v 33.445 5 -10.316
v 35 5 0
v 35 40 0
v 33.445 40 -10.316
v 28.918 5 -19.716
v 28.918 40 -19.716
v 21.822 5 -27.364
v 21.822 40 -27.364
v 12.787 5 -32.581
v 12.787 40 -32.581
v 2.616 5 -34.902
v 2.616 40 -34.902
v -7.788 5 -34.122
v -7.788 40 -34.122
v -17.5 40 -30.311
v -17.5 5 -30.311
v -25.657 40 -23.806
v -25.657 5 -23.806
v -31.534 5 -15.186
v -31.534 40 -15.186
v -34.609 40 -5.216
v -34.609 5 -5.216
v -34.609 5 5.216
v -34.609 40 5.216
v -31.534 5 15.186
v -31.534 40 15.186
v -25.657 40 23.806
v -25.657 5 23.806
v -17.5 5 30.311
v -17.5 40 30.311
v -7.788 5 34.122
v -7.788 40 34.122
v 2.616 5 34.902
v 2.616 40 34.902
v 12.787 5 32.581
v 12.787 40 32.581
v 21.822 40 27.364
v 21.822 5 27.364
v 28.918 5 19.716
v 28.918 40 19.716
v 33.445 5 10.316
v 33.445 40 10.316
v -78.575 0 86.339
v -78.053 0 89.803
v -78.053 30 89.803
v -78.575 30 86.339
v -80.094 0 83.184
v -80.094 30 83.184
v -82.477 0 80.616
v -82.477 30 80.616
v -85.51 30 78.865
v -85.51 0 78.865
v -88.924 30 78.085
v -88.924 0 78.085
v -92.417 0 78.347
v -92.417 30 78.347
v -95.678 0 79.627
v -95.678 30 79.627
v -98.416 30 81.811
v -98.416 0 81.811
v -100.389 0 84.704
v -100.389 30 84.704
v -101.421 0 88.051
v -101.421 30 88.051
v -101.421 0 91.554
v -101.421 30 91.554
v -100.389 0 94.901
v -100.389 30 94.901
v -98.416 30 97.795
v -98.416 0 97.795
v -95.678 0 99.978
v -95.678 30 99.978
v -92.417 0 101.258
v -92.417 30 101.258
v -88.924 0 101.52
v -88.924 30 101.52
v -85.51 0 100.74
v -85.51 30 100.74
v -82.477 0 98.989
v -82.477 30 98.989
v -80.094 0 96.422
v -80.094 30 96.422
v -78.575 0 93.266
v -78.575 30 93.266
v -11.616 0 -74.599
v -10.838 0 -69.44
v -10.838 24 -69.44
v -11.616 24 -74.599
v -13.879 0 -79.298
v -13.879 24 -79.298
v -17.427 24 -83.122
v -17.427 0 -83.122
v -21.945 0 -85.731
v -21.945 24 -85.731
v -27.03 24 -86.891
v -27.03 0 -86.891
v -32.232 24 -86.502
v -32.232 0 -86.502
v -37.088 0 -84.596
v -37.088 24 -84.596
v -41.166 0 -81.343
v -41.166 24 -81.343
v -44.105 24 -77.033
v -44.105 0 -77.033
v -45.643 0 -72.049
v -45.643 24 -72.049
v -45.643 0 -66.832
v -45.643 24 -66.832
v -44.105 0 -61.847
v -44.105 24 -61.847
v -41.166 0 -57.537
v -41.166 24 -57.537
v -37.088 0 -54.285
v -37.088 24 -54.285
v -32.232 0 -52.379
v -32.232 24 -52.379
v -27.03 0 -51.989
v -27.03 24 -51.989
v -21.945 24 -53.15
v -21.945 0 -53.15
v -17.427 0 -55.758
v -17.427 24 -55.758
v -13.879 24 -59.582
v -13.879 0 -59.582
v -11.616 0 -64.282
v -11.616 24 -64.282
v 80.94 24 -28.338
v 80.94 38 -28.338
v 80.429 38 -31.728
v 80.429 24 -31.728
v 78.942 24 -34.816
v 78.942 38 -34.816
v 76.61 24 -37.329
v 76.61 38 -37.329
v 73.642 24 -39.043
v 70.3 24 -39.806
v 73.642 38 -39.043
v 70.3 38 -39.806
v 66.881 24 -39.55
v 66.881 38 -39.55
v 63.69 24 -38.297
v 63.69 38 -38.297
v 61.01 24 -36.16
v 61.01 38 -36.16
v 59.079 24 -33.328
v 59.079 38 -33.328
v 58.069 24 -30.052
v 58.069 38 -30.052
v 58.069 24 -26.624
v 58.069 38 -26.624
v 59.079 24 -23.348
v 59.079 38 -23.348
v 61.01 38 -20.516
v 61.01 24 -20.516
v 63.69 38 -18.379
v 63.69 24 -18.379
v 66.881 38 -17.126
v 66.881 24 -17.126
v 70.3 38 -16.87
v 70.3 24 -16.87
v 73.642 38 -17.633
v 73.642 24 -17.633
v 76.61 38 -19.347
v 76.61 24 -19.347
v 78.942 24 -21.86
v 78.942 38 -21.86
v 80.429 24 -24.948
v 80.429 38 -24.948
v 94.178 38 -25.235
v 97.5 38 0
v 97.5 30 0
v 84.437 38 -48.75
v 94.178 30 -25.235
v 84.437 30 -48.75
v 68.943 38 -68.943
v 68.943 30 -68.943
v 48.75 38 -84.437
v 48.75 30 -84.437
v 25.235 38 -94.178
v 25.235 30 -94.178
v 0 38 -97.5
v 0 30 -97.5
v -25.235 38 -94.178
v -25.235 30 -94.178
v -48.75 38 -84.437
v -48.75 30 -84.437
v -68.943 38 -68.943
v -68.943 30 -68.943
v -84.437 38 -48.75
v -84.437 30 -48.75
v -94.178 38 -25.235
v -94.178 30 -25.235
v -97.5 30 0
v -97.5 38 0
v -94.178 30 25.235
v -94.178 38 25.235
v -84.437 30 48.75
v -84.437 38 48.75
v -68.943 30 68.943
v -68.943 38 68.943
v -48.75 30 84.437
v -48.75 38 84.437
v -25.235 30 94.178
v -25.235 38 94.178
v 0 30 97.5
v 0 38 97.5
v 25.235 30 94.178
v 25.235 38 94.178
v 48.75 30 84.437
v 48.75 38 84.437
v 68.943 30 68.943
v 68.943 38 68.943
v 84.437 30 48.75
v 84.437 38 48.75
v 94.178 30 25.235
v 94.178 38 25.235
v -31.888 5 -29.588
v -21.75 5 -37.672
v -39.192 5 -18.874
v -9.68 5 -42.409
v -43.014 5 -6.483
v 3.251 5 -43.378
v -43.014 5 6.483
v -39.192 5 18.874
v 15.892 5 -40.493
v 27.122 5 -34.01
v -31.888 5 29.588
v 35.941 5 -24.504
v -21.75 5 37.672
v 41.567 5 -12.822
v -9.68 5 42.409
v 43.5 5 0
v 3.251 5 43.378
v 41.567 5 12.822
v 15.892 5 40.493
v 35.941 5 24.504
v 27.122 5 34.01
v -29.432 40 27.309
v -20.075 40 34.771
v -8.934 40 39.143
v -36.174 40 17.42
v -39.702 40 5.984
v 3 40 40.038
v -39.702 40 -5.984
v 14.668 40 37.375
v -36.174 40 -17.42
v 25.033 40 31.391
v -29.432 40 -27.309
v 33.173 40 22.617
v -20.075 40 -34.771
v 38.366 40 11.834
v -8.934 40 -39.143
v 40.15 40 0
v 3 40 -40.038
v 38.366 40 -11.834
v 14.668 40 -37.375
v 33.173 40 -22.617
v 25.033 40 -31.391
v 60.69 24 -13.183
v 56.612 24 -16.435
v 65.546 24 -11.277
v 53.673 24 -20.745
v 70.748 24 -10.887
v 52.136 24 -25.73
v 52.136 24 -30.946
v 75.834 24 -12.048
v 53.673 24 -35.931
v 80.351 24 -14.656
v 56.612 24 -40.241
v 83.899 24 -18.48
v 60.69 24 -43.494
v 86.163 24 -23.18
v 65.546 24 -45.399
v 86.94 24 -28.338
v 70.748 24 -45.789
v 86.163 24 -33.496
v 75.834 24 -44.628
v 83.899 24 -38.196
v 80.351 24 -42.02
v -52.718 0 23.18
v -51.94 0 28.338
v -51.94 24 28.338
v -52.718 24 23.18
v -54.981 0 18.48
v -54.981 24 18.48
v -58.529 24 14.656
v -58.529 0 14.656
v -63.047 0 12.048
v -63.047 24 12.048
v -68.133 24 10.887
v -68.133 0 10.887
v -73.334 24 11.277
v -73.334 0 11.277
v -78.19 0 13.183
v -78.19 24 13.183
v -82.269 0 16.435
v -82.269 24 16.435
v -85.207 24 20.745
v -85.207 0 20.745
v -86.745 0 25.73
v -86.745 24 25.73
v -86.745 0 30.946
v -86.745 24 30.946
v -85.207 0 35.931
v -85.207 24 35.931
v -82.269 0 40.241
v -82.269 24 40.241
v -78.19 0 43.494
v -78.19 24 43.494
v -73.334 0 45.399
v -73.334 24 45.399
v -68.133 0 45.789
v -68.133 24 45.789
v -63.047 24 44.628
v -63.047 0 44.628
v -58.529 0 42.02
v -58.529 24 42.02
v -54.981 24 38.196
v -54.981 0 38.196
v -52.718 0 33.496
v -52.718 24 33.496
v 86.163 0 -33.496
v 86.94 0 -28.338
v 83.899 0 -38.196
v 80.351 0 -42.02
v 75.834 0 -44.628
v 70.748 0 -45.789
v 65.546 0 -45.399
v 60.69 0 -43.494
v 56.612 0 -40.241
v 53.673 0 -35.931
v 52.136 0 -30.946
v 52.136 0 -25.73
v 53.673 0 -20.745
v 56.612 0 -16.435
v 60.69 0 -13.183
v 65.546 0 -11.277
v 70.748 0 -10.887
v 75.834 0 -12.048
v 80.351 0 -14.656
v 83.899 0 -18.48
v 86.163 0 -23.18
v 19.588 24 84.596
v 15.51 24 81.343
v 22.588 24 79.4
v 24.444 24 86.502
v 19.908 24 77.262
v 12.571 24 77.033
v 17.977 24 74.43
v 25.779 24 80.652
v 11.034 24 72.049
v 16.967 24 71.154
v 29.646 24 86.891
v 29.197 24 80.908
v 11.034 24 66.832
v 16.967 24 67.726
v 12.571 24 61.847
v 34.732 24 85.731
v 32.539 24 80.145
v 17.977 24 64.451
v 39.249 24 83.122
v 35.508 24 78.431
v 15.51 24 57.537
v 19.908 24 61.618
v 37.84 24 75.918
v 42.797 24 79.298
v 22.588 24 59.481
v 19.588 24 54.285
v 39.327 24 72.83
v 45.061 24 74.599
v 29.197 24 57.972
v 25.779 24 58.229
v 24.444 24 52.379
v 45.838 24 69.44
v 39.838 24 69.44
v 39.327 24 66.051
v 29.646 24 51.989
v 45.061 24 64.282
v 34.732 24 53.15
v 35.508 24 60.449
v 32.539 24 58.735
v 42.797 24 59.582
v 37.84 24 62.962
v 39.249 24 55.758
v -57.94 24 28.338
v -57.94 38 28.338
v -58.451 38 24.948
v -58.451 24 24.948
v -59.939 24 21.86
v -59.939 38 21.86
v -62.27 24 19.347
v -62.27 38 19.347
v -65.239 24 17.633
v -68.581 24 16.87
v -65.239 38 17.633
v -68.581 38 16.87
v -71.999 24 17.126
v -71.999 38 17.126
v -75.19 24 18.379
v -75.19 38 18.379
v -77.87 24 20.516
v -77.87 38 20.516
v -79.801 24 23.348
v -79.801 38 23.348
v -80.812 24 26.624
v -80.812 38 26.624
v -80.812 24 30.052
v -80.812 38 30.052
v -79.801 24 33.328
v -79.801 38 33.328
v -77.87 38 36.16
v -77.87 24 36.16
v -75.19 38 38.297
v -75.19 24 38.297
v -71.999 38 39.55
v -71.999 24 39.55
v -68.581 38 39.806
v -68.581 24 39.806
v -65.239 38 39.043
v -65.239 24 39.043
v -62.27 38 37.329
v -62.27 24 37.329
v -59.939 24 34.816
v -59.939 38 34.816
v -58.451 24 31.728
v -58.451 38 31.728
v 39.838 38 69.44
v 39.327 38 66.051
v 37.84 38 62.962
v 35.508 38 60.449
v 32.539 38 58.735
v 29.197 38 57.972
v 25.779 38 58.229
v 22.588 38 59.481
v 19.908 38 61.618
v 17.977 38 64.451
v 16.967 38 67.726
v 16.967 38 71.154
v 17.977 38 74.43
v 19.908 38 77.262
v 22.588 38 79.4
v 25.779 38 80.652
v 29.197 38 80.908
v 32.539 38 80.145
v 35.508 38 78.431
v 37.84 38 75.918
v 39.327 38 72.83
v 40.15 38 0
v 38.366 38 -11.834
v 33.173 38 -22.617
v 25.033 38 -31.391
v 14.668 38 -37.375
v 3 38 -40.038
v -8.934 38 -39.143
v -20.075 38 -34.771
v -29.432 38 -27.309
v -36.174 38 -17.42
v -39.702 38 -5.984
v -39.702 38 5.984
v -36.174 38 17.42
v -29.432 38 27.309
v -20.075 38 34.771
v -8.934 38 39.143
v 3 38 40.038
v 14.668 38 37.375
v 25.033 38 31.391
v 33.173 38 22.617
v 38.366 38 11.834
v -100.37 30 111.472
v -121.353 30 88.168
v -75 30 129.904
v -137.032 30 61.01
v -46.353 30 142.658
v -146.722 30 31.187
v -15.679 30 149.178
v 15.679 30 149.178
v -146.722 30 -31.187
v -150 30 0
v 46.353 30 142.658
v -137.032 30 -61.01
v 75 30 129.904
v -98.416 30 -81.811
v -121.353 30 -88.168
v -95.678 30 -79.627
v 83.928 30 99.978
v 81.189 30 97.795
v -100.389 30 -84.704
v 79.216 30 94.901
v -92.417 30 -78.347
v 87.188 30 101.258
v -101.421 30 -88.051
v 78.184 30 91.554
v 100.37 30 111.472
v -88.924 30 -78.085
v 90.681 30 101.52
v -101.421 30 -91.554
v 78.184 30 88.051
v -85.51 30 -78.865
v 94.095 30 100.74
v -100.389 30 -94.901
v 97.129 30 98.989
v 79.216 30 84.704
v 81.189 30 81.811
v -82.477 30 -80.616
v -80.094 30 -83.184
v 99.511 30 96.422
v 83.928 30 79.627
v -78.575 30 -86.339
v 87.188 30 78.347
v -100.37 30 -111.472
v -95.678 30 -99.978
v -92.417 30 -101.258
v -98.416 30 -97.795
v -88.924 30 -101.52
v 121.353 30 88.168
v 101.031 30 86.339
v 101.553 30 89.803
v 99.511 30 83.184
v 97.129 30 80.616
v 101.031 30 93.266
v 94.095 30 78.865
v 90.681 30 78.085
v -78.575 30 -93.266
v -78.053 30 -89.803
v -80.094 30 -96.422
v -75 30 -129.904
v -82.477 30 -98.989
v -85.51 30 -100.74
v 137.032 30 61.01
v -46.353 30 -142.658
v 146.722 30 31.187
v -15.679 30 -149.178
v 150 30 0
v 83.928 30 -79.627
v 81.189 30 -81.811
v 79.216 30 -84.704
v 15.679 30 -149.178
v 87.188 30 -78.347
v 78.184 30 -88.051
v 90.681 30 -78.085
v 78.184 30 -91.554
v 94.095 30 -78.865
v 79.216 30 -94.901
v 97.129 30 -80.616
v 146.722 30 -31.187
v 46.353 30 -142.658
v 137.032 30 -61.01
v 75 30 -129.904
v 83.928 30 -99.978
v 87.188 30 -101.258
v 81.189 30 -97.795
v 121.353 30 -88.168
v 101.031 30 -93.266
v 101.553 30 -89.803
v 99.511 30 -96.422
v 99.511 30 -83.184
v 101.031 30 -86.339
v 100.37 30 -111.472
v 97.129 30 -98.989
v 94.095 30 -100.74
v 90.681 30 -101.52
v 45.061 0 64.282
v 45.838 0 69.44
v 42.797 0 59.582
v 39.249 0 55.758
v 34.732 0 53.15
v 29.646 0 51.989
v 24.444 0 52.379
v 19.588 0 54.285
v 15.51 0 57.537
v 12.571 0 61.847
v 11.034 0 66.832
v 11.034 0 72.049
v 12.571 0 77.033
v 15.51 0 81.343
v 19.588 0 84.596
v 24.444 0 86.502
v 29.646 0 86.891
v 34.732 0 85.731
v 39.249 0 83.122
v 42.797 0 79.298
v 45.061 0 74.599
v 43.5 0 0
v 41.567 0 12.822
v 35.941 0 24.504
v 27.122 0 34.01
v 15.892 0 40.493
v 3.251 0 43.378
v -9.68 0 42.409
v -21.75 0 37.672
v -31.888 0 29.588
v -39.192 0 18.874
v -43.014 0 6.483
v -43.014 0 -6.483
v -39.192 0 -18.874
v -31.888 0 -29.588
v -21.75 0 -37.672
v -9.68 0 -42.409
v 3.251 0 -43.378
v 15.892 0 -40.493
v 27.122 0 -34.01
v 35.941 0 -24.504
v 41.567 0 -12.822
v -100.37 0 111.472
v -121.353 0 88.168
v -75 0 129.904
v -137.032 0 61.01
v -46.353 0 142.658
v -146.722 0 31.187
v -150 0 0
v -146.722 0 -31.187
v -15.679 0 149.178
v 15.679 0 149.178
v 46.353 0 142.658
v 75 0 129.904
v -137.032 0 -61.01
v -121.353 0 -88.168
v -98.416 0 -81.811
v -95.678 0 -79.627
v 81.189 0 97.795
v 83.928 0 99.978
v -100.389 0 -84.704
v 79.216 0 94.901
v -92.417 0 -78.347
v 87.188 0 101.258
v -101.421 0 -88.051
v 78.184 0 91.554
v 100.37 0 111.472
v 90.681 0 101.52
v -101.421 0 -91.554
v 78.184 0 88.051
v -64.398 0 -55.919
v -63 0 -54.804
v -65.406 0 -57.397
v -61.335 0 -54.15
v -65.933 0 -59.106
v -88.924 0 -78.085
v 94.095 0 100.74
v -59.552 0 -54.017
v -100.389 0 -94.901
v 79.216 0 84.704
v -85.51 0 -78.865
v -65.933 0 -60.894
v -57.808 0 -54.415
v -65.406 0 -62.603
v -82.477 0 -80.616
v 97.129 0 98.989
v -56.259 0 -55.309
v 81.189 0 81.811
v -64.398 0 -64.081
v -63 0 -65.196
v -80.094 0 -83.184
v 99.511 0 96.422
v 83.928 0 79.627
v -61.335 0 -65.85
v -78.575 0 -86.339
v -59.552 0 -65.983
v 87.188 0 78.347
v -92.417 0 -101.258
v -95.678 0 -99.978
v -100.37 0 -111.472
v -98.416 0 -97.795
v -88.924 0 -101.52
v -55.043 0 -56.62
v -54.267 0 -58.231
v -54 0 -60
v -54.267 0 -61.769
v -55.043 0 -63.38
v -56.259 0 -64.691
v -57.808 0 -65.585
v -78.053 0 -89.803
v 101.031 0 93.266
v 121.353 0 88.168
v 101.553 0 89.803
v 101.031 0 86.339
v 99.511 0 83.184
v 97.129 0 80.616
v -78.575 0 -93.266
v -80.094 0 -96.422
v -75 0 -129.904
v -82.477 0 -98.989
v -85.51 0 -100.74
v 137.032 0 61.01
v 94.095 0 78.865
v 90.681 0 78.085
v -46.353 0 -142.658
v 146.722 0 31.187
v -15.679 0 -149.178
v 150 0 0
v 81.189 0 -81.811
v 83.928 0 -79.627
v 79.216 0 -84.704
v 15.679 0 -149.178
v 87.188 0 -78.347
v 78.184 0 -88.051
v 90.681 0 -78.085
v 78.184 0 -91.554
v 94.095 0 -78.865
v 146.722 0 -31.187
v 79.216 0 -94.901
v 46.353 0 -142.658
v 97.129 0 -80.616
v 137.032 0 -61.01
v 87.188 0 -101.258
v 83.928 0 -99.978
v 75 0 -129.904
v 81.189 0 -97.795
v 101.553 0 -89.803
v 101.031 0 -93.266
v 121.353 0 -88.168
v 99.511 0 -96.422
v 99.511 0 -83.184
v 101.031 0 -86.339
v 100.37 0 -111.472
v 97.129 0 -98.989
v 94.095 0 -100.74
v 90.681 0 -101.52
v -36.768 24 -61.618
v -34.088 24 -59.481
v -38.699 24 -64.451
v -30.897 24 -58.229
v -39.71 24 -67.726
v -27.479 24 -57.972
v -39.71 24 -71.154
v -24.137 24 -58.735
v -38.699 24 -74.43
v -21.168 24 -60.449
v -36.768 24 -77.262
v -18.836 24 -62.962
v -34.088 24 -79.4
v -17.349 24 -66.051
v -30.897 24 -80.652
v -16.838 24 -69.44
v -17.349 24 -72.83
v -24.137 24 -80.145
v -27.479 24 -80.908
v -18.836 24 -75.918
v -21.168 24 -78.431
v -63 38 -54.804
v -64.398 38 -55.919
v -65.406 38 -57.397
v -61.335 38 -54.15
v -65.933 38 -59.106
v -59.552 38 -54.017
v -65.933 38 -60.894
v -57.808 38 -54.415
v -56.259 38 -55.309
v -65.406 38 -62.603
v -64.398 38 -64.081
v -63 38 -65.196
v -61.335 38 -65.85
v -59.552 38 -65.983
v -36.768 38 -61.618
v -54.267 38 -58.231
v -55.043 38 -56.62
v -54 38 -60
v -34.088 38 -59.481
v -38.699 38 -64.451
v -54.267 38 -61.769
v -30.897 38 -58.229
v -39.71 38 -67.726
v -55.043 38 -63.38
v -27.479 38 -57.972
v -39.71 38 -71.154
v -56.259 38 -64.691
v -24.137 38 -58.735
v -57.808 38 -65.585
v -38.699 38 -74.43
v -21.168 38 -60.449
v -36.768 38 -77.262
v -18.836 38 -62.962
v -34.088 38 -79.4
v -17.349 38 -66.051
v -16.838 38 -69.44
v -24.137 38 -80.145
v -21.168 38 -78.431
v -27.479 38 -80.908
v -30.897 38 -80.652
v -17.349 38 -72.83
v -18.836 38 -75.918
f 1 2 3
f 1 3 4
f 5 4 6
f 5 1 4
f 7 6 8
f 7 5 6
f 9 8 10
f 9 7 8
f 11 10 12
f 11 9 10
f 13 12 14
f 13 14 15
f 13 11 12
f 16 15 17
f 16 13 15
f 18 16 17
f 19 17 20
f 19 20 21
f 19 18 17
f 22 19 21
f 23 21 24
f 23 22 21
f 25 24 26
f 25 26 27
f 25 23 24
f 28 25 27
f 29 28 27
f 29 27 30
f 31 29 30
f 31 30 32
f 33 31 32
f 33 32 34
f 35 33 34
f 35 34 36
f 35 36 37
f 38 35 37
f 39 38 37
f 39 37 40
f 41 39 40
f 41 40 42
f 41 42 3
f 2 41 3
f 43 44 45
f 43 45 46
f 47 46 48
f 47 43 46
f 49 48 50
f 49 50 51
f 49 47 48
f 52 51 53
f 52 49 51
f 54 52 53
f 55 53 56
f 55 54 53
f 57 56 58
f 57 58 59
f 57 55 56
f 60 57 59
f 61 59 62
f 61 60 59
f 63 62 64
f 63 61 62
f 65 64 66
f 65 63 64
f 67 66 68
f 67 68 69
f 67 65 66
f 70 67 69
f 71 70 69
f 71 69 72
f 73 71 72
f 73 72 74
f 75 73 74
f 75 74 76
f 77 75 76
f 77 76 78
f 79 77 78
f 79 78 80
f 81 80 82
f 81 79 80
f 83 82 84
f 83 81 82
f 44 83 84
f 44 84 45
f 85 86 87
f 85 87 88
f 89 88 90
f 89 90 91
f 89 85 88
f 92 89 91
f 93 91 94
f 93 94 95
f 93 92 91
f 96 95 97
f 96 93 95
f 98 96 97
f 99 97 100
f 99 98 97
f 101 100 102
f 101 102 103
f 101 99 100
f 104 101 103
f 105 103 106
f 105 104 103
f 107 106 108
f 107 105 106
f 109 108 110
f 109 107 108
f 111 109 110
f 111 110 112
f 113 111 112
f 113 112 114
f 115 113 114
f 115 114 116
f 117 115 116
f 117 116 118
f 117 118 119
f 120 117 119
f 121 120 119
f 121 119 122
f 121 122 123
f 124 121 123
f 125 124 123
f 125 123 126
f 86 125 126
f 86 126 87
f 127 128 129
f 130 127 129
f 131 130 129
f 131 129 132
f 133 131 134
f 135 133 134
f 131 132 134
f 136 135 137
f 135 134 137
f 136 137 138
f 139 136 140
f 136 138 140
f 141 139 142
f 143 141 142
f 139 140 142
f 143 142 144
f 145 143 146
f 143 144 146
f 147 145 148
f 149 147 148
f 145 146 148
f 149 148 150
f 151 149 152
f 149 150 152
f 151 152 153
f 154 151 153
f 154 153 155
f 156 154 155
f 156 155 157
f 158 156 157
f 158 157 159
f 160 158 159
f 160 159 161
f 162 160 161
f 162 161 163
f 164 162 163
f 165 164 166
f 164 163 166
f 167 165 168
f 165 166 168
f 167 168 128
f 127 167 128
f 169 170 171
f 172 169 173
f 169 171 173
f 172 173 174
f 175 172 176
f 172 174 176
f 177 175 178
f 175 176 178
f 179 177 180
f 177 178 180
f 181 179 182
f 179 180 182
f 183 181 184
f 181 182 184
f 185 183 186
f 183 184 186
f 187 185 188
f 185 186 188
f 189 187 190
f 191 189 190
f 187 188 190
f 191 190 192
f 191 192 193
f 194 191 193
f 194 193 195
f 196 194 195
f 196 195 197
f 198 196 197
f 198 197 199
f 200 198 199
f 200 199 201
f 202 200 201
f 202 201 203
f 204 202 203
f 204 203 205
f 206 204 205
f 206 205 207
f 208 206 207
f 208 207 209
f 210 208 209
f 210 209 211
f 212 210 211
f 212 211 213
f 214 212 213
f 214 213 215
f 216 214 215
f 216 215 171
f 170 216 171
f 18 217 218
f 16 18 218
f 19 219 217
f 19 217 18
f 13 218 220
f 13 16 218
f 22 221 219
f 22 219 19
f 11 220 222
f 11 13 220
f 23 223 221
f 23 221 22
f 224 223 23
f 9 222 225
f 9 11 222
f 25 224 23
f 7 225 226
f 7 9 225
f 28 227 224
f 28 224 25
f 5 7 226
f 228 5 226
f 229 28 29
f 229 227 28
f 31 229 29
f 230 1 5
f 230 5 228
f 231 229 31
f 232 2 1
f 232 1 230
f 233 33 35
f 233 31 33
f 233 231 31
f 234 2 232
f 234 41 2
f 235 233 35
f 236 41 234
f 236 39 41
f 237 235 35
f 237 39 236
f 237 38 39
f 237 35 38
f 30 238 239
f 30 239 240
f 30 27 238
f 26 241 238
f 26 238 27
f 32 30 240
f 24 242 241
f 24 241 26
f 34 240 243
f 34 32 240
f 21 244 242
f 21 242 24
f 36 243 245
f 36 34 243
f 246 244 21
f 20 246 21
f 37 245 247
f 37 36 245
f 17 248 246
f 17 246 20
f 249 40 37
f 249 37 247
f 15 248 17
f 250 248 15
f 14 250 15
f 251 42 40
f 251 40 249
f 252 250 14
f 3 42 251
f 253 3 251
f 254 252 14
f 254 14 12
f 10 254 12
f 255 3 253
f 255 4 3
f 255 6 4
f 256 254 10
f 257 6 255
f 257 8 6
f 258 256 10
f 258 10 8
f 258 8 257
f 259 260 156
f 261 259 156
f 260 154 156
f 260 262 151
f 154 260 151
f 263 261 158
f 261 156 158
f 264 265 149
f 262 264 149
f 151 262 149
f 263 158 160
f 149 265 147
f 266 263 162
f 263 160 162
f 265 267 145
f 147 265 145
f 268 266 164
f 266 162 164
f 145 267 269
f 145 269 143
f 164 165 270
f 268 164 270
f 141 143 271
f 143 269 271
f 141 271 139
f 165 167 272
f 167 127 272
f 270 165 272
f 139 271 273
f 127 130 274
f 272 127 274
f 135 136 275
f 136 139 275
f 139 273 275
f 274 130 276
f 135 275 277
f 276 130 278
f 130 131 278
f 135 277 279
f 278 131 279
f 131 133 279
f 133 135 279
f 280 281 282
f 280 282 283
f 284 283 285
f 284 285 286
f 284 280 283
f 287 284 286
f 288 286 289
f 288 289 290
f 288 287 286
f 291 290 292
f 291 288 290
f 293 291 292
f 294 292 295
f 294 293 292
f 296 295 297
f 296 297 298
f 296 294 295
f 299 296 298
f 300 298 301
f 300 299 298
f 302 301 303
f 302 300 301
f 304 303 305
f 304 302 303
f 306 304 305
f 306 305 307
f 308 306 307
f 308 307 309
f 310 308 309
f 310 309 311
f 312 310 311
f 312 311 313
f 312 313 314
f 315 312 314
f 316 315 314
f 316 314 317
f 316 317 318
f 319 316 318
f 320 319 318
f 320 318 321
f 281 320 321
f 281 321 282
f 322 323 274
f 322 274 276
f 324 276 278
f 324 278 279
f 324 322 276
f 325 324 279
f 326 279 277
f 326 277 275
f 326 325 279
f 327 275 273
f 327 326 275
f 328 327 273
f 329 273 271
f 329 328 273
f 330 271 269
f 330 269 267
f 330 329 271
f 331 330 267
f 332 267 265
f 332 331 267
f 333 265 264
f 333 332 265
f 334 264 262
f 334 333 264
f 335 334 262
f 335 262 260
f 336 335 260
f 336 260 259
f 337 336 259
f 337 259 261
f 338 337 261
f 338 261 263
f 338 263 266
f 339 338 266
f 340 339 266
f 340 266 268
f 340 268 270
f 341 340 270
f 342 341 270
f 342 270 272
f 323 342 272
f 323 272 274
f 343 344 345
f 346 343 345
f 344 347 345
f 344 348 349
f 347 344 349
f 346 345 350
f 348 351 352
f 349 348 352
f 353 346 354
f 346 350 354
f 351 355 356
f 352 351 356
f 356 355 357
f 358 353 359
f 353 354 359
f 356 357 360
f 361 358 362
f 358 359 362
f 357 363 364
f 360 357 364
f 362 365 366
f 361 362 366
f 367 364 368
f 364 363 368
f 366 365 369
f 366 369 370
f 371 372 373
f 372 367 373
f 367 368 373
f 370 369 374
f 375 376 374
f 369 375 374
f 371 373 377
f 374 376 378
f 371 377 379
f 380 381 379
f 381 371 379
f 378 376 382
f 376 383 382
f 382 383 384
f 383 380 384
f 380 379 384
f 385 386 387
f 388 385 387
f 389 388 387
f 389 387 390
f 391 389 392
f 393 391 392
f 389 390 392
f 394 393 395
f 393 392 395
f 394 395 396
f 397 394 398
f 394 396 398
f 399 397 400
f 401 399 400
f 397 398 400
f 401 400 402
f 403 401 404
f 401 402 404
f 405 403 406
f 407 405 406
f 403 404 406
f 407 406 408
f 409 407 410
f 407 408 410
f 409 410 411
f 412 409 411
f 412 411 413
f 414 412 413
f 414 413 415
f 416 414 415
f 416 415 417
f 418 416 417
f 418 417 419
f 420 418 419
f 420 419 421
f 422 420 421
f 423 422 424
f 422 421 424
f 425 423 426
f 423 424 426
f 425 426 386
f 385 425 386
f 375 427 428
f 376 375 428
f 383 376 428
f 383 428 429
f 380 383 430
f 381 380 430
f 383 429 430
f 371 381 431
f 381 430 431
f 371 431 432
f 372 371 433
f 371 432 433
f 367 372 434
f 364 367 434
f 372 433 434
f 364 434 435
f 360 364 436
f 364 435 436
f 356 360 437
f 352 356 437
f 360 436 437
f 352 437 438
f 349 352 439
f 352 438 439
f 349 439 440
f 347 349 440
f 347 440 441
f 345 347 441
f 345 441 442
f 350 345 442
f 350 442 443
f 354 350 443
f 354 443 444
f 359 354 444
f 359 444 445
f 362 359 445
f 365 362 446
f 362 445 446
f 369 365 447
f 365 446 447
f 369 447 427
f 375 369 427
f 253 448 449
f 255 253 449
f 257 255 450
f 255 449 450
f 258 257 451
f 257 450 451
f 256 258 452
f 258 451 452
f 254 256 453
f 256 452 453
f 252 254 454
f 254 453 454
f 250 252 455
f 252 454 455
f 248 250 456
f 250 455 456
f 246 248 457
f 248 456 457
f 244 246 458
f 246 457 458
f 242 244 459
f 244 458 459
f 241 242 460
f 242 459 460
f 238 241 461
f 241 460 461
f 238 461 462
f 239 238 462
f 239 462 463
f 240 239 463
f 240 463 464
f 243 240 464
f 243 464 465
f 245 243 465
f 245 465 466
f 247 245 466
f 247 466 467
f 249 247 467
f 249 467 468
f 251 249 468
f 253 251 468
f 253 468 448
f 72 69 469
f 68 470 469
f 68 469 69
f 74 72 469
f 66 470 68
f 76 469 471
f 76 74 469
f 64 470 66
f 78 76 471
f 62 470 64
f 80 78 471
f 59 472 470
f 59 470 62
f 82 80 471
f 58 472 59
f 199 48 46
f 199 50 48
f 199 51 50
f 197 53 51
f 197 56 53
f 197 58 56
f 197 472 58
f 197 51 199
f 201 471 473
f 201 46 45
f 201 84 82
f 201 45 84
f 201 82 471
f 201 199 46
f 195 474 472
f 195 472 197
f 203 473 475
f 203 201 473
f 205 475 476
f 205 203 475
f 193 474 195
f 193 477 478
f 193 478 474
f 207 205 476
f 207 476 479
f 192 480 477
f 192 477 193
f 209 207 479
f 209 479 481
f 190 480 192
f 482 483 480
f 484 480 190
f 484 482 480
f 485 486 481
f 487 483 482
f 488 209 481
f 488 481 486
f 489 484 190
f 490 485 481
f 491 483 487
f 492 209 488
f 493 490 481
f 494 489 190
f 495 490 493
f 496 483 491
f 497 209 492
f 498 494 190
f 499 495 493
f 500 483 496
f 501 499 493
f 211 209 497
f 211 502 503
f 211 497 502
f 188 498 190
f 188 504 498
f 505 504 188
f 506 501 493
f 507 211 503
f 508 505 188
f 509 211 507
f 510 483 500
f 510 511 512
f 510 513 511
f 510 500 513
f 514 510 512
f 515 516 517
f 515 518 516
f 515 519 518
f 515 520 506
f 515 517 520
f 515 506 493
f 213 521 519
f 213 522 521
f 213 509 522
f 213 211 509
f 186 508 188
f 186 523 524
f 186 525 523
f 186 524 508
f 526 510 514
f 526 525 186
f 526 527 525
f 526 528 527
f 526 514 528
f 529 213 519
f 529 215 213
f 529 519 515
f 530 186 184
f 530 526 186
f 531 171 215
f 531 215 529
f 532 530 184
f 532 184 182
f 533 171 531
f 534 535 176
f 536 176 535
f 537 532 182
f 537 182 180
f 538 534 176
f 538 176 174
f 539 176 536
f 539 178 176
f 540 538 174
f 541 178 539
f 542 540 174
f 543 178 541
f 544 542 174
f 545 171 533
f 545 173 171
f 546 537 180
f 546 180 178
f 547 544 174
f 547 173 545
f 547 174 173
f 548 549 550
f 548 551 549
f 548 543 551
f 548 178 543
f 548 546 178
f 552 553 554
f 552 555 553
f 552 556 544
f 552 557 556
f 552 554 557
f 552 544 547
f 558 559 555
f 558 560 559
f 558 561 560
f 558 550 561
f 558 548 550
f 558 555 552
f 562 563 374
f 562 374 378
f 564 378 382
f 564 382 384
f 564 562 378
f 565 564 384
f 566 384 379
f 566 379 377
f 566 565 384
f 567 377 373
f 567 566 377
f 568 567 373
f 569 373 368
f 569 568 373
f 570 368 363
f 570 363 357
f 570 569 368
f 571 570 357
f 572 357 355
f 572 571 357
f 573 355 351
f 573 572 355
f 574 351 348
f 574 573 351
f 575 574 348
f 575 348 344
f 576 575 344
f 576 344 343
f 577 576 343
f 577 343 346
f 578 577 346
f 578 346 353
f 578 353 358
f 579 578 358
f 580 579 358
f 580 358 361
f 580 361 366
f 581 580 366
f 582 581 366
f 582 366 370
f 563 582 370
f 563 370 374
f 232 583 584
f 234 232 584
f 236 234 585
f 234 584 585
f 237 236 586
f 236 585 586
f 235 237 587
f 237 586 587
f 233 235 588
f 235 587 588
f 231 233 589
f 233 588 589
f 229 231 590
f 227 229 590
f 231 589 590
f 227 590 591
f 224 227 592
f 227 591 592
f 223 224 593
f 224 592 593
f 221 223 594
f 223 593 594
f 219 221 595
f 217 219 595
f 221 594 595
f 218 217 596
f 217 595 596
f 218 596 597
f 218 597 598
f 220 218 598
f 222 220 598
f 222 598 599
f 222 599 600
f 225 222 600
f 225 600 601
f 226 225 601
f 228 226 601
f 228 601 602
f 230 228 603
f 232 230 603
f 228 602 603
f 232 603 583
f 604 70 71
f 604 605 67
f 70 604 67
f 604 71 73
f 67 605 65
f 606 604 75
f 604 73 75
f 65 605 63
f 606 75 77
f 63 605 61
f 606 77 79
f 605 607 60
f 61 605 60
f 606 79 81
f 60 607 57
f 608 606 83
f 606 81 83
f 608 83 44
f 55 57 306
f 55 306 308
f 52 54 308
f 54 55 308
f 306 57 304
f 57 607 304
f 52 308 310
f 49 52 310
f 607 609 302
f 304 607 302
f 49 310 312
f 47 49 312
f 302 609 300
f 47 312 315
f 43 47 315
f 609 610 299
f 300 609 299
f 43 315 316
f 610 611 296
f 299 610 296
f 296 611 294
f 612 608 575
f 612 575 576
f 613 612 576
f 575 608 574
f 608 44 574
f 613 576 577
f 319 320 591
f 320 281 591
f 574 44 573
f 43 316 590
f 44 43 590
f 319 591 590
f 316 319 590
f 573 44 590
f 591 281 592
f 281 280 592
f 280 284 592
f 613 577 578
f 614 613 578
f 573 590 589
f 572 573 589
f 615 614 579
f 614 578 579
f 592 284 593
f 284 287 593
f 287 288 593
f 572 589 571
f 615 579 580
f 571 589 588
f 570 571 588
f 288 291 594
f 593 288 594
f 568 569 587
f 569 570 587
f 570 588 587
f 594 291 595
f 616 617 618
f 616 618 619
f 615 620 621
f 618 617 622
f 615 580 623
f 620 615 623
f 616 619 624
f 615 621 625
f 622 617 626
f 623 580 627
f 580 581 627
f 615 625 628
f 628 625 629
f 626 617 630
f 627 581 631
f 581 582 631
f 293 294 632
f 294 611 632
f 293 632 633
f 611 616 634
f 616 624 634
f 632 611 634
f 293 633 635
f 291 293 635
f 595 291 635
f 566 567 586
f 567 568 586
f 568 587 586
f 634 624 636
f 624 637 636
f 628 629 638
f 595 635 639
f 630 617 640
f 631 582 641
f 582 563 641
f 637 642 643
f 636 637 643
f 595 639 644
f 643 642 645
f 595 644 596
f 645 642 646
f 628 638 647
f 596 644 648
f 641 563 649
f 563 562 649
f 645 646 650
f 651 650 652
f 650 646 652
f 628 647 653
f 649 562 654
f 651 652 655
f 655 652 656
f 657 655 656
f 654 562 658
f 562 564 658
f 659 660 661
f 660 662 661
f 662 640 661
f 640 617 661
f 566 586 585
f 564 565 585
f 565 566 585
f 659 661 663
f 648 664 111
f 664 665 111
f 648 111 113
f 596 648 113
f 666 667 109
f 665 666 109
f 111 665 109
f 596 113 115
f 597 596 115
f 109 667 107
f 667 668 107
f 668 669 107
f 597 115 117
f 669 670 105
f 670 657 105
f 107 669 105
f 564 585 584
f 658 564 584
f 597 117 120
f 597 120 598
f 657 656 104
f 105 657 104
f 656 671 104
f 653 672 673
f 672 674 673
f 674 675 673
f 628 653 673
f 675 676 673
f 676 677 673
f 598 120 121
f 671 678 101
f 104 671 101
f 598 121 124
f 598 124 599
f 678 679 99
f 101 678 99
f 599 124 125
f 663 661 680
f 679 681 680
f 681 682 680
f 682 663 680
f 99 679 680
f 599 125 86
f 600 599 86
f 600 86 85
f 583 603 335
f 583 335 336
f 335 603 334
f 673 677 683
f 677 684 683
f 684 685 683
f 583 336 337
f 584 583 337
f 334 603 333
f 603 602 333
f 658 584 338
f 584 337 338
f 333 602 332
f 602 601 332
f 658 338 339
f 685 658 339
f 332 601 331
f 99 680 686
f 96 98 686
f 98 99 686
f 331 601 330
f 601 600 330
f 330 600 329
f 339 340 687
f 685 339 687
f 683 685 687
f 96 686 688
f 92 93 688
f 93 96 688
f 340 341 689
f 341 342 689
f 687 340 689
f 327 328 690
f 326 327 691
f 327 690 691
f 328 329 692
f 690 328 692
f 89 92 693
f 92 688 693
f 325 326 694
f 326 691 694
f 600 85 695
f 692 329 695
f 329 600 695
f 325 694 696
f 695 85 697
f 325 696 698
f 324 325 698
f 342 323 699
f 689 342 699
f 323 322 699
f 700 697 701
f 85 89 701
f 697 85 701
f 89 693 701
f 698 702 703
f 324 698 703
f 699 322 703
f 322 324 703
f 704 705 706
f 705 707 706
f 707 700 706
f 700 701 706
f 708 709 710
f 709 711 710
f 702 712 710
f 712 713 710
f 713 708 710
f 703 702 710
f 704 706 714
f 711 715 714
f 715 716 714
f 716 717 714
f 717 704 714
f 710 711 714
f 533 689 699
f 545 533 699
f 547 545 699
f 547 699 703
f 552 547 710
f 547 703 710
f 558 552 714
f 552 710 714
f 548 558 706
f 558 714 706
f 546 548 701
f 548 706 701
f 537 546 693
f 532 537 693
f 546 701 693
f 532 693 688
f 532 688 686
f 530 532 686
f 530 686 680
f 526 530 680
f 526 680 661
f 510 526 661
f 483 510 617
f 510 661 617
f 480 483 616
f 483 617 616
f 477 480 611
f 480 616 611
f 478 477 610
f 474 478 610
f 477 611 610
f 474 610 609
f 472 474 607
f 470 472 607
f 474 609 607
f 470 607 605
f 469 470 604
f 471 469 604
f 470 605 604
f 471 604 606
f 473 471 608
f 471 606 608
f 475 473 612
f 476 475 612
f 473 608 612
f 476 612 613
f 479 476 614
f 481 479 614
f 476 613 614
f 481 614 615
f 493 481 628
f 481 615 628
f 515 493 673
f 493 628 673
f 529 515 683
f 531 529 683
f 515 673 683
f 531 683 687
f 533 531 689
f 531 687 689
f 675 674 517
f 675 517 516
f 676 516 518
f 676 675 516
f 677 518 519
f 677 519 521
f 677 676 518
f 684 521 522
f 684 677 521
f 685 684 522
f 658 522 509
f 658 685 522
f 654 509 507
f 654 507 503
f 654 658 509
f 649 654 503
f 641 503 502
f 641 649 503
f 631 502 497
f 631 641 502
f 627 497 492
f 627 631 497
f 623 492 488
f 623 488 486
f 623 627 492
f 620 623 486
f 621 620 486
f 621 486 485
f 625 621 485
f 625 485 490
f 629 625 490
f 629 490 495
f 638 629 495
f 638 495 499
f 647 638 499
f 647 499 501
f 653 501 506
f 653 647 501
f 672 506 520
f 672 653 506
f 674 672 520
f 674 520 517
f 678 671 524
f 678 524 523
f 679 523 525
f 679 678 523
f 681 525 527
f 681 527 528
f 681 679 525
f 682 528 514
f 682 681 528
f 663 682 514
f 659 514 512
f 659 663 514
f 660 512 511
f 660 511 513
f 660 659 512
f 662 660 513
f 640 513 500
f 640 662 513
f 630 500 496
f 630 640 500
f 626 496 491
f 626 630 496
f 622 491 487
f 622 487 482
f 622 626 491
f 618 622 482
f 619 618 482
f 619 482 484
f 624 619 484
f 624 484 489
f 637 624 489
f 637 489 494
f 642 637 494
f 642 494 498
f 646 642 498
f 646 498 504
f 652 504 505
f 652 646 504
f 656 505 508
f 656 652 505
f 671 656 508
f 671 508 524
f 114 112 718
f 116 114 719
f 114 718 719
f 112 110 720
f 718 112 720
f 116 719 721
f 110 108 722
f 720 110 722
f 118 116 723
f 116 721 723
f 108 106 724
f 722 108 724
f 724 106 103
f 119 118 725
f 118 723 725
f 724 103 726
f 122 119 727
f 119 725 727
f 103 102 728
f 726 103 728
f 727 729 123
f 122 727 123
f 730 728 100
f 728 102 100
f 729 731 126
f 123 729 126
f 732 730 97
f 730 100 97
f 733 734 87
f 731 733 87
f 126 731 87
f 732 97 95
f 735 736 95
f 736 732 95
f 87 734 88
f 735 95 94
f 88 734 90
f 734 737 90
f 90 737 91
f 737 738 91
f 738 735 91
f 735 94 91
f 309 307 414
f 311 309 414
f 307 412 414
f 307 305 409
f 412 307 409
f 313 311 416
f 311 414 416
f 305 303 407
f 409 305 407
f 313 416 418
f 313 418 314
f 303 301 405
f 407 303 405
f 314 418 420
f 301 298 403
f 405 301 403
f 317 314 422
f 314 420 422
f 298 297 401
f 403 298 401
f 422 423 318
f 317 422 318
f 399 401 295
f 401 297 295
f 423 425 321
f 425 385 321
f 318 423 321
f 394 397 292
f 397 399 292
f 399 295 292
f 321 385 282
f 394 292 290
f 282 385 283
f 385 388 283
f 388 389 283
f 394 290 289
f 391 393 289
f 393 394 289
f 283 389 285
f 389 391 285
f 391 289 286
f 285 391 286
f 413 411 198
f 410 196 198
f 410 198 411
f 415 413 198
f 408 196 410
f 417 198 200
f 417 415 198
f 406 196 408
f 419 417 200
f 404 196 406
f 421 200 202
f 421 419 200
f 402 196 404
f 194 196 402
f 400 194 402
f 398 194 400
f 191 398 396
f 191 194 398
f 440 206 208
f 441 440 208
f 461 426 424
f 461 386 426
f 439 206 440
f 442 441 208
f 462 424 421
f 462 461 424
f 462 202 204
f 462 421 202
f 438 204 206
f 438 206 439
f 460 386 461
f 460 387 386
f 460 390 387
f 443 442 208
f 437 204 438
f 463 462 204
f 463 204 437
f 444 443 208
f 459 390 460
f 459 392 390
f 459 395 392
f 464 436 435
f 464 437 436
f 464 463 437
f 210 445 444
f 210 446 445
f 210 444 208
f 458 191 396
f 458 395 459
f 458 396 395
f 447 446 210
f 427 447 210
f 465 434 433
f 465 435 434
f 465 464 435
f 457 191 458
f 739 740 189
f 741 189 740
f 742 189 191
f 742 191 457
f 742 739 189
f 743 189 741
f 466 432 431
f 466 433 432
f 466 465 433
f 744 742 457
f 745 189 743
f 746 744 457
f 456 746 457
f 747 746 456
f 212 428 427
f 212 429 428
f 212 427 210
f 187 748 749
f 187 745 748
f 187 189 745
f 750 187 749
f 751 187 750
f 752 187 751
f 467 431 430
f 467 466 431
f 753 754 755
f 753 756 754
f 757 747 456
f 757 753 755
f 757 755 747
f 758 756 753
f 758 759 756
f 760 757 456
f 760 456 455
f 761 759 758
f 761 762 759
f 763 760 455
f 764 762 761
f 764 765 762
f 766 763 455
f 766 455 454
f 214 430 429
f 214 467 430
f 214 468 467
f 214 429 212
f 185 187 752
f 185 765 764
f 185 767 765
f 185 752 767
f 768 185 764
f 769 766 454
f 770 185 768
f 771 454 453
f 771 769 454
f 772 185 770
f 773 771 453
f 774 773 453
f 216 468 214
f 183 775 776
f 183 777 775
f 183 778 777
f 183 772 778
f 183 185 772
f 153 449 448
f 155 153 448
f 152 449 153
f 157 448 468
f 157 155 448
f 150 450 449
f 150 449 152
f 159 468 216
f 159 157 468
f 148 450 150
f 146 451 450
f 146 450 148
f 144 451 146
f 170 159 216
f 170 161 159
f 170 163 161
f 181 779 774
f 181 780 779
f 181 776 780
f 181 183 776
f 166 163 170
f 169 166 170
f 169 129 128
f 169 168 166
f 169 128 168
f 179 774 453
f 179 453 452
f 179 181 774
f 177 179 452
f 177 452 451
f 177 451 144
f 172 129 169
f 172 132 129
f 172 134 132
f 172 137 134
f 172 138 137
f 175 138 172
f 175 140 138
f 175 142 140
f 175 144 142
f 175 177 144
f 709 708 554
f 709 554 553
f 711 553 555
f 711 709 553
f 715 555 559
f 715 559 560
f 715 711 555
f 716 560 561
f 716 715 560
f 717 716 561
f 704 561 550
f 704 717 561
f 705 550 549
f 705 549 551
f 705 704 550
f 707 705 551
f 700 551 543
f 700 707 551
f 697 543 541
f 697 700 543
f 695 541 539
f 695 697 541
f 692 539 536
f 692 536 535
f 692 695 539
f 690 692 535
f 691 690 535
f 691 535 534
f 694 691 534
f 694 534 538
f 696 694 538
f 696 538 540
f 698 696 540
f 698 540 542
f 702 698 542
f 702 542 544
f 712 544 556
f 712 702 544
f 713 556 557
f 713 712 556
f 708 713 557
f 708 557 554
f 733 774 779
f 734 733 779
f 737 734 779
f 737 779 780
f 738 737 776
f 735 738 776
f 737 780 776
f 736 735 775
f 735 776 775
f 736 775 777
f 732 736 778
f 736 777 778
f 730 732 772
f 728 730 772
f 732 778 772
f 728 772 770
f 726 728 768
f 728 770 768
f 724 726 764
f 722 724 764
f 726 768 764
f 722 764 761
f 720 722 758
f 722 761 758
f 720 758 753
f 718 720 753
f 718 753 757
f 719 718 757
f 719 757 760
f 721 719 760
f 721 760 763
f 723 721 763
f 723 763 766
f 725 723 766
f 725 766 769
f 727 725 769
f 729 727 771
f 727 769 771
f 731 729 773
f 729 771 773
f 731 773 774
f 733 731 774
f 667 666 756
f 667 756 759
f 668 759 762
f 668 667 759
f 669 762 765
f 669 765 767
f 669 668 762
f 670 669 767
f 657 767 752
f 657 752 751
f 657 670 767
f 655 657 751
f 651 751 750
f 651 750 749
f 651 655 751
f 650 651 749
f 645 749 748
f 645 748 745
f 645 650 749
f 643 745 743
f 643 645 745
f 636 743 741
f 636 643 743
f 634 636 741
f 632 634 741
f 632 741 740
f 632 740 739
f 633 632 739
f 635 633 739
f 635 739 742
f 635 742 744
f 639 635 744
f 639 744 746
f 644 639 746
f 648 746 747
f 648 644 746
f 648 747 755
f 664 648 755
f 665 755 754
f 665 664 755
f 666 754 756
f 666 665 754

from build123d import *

# Parameters (mm, degrees)
SKETCH1_R               = 150
SKETCH1_R_2             = 97.5
SKETCH1_R_3             = 11.75
BOSS_EXTRUDE1_DEPTH     = 30
SKETCH1_3_R             = 97.5
SKETCH1_3_R_2           = 40.15
SKETCH1_3_R_3           = 17.5
SKETCH1_3_R_4           = 6
BOSS_EXTRUDE2_DEPTH     = 38
SKETCH1_4_R             = 40.15
SKETCH1_4_R_2           = 35
BOSS_EXTRUDE3_DEPTH     = 40
BOSS_EXTRUDE4_START     = 38
SKETCH1_5_R             = 17.5
SKETCH1_5_R_2           = 11.5
BOSS_EXTRUDE4_DEPTH     = 14
SKETCH2_R               = 43.5
CUT_EXTRUDE1_DEPTH      = 1
CUT_EXTRUDE1_DEPTH_BACK = 5


with BuildPart() as part:
    # Sketch1 → Boss-Extrude1 (new body)
    with BuildSketch(Plane(origin=(0, 0, 0), x_dir=(1, 0, 0), z_dir=(0, 1, 0))):
        Circle(SKETCH1_R)
        Circle(SKETCH1_R_2, mode=Mode.SUBTRACT)
        with Locations((-89.802561211, -89.802561211)):
            Circle(SKETCH1_R_3, mode=Mode.SUBTRACT)
        with Locations((89.802561211, -89.802561211)):
            Circle(SKETCH1_R_3, mode=Mode.SUBTRACT)
        with Locations((89.802561211, 89.802561211)):
            Circle(SKETCH1_R_3, mode=Mode.SUBTRACT)
        with Locations((-89.802561211, 89.802561211)):
            Circle(SKETCH1_R_3, mode=Mode.SUBTRACT)
    extrude(amount=BOSS_EXTRUDE1_DEPTH)

    # Sketch1<3> → Boss-Extrude2 (add)
    with BuildSketch(Plane(origin=(0, 0, 0), x_dir=(1, 0, 0), z_dir=(0, 1, 0))):
        Circle(SKETCH1_3_R)
        Circle(SKETCH1_3_R_2, mode=Mode.SUBTRACT)
        with Locations((-28.338059011, 69.440293861)):
            Circle(SKETCH1_3_R_3, mode=Mode.SUBTRACT)
        with Locations((-69.440293861, -28.338059011)):
            Circle(SKETCH1_3_R_3, mode=Mode.SUBTRACT)
        with Locations((28.338059011, -69.440293861)):
            Circle(SKETCH1_3_R_3, mode=Mode.SUBTRACT)
        with Locations((69.440293861, 28.338059011)):
            Circle(SKETCH1_3_R_3, mode=Mode.SUBTRACT)
        with Locations((-60, 60)):
            Circle(SKETCH1_3_R_4, mode=Mode.SUBTRACT)
    extrude(amount=BOSS_EXTRUDE2_DEPTH)

    # Sketch1<4> → Boss-Extrude3 (add)
    with BuildSketch(Plane(origin=(0, 0, 0), x_dir=(1, 0, 0), z_dir=(0, 1, 0))):
        Circle(SKETCH1_4_R)
        Circle(SKETCH1_4_R_2, mode=Mode.SUBTRACT)
    extrude(amount=BOSS_EXTRUDE3_DEPTH)

    # Sketch1<5> → Boss-Extrude4 (add)
    with BuildSketch(Plane(origin=(0, 0, 0), x_dir=(1, 0, 0), z_dir=(0, 1, 0)).offset(BOSS_EXTRUDE4_START)):
        with Locations((-28.338059011, 69.440293861)):
            Circle(SKETCH1_5_R)
        with Locations((-28.338059011, 69.440293861)):
            Circle(SKETCH1_5_R_2, mode=Mode.SUBTRACT)
        with Locations((69.440293861, 28.338059011)):
            Circle(SKETCH1_5_R)
        with Locations((69.440293861, 28.338059011)):
            Circle(SKETCH1_5_R_2, mode=Mode.SUBTRACT)
        with Locations((28.338059011, -69.440293861)):
            Circle(SKETCH1_5_R)
        with Locations((28.338059011, -69.440293861)):
            Circle(SKETCH1_5_R_2, mode=Mode.SUBTRACT)
        with Locations((-69.440293861, -28.338059011)):
            Circle(SKETCH1_5_R)
        with Locations((-69.440293861, -28.338059011)):
            Circle(SKETCH1_5_R_2, mode=Mode.SUBTRACT)
    extrude(amount=-BOSS_EXTRUDE4_DEPTH)

    # Sketch2 → Cut-Extrude1 (cut, two sides)
    with BuildSketch(Plane.XZ) as cut_extrude1_sk:
        Circle(SKETCH2_R)
    extrude(amount=CUT_EXTRUDE1_DEPTH, mode=Mode.SUBTRACT)
    extrude(cut_extrude1_sk.sketch, amount=-CUT_EXTRUDE1_DEPTH_BACK, mode=Mode.SUBTRACT)


solid = part.part
